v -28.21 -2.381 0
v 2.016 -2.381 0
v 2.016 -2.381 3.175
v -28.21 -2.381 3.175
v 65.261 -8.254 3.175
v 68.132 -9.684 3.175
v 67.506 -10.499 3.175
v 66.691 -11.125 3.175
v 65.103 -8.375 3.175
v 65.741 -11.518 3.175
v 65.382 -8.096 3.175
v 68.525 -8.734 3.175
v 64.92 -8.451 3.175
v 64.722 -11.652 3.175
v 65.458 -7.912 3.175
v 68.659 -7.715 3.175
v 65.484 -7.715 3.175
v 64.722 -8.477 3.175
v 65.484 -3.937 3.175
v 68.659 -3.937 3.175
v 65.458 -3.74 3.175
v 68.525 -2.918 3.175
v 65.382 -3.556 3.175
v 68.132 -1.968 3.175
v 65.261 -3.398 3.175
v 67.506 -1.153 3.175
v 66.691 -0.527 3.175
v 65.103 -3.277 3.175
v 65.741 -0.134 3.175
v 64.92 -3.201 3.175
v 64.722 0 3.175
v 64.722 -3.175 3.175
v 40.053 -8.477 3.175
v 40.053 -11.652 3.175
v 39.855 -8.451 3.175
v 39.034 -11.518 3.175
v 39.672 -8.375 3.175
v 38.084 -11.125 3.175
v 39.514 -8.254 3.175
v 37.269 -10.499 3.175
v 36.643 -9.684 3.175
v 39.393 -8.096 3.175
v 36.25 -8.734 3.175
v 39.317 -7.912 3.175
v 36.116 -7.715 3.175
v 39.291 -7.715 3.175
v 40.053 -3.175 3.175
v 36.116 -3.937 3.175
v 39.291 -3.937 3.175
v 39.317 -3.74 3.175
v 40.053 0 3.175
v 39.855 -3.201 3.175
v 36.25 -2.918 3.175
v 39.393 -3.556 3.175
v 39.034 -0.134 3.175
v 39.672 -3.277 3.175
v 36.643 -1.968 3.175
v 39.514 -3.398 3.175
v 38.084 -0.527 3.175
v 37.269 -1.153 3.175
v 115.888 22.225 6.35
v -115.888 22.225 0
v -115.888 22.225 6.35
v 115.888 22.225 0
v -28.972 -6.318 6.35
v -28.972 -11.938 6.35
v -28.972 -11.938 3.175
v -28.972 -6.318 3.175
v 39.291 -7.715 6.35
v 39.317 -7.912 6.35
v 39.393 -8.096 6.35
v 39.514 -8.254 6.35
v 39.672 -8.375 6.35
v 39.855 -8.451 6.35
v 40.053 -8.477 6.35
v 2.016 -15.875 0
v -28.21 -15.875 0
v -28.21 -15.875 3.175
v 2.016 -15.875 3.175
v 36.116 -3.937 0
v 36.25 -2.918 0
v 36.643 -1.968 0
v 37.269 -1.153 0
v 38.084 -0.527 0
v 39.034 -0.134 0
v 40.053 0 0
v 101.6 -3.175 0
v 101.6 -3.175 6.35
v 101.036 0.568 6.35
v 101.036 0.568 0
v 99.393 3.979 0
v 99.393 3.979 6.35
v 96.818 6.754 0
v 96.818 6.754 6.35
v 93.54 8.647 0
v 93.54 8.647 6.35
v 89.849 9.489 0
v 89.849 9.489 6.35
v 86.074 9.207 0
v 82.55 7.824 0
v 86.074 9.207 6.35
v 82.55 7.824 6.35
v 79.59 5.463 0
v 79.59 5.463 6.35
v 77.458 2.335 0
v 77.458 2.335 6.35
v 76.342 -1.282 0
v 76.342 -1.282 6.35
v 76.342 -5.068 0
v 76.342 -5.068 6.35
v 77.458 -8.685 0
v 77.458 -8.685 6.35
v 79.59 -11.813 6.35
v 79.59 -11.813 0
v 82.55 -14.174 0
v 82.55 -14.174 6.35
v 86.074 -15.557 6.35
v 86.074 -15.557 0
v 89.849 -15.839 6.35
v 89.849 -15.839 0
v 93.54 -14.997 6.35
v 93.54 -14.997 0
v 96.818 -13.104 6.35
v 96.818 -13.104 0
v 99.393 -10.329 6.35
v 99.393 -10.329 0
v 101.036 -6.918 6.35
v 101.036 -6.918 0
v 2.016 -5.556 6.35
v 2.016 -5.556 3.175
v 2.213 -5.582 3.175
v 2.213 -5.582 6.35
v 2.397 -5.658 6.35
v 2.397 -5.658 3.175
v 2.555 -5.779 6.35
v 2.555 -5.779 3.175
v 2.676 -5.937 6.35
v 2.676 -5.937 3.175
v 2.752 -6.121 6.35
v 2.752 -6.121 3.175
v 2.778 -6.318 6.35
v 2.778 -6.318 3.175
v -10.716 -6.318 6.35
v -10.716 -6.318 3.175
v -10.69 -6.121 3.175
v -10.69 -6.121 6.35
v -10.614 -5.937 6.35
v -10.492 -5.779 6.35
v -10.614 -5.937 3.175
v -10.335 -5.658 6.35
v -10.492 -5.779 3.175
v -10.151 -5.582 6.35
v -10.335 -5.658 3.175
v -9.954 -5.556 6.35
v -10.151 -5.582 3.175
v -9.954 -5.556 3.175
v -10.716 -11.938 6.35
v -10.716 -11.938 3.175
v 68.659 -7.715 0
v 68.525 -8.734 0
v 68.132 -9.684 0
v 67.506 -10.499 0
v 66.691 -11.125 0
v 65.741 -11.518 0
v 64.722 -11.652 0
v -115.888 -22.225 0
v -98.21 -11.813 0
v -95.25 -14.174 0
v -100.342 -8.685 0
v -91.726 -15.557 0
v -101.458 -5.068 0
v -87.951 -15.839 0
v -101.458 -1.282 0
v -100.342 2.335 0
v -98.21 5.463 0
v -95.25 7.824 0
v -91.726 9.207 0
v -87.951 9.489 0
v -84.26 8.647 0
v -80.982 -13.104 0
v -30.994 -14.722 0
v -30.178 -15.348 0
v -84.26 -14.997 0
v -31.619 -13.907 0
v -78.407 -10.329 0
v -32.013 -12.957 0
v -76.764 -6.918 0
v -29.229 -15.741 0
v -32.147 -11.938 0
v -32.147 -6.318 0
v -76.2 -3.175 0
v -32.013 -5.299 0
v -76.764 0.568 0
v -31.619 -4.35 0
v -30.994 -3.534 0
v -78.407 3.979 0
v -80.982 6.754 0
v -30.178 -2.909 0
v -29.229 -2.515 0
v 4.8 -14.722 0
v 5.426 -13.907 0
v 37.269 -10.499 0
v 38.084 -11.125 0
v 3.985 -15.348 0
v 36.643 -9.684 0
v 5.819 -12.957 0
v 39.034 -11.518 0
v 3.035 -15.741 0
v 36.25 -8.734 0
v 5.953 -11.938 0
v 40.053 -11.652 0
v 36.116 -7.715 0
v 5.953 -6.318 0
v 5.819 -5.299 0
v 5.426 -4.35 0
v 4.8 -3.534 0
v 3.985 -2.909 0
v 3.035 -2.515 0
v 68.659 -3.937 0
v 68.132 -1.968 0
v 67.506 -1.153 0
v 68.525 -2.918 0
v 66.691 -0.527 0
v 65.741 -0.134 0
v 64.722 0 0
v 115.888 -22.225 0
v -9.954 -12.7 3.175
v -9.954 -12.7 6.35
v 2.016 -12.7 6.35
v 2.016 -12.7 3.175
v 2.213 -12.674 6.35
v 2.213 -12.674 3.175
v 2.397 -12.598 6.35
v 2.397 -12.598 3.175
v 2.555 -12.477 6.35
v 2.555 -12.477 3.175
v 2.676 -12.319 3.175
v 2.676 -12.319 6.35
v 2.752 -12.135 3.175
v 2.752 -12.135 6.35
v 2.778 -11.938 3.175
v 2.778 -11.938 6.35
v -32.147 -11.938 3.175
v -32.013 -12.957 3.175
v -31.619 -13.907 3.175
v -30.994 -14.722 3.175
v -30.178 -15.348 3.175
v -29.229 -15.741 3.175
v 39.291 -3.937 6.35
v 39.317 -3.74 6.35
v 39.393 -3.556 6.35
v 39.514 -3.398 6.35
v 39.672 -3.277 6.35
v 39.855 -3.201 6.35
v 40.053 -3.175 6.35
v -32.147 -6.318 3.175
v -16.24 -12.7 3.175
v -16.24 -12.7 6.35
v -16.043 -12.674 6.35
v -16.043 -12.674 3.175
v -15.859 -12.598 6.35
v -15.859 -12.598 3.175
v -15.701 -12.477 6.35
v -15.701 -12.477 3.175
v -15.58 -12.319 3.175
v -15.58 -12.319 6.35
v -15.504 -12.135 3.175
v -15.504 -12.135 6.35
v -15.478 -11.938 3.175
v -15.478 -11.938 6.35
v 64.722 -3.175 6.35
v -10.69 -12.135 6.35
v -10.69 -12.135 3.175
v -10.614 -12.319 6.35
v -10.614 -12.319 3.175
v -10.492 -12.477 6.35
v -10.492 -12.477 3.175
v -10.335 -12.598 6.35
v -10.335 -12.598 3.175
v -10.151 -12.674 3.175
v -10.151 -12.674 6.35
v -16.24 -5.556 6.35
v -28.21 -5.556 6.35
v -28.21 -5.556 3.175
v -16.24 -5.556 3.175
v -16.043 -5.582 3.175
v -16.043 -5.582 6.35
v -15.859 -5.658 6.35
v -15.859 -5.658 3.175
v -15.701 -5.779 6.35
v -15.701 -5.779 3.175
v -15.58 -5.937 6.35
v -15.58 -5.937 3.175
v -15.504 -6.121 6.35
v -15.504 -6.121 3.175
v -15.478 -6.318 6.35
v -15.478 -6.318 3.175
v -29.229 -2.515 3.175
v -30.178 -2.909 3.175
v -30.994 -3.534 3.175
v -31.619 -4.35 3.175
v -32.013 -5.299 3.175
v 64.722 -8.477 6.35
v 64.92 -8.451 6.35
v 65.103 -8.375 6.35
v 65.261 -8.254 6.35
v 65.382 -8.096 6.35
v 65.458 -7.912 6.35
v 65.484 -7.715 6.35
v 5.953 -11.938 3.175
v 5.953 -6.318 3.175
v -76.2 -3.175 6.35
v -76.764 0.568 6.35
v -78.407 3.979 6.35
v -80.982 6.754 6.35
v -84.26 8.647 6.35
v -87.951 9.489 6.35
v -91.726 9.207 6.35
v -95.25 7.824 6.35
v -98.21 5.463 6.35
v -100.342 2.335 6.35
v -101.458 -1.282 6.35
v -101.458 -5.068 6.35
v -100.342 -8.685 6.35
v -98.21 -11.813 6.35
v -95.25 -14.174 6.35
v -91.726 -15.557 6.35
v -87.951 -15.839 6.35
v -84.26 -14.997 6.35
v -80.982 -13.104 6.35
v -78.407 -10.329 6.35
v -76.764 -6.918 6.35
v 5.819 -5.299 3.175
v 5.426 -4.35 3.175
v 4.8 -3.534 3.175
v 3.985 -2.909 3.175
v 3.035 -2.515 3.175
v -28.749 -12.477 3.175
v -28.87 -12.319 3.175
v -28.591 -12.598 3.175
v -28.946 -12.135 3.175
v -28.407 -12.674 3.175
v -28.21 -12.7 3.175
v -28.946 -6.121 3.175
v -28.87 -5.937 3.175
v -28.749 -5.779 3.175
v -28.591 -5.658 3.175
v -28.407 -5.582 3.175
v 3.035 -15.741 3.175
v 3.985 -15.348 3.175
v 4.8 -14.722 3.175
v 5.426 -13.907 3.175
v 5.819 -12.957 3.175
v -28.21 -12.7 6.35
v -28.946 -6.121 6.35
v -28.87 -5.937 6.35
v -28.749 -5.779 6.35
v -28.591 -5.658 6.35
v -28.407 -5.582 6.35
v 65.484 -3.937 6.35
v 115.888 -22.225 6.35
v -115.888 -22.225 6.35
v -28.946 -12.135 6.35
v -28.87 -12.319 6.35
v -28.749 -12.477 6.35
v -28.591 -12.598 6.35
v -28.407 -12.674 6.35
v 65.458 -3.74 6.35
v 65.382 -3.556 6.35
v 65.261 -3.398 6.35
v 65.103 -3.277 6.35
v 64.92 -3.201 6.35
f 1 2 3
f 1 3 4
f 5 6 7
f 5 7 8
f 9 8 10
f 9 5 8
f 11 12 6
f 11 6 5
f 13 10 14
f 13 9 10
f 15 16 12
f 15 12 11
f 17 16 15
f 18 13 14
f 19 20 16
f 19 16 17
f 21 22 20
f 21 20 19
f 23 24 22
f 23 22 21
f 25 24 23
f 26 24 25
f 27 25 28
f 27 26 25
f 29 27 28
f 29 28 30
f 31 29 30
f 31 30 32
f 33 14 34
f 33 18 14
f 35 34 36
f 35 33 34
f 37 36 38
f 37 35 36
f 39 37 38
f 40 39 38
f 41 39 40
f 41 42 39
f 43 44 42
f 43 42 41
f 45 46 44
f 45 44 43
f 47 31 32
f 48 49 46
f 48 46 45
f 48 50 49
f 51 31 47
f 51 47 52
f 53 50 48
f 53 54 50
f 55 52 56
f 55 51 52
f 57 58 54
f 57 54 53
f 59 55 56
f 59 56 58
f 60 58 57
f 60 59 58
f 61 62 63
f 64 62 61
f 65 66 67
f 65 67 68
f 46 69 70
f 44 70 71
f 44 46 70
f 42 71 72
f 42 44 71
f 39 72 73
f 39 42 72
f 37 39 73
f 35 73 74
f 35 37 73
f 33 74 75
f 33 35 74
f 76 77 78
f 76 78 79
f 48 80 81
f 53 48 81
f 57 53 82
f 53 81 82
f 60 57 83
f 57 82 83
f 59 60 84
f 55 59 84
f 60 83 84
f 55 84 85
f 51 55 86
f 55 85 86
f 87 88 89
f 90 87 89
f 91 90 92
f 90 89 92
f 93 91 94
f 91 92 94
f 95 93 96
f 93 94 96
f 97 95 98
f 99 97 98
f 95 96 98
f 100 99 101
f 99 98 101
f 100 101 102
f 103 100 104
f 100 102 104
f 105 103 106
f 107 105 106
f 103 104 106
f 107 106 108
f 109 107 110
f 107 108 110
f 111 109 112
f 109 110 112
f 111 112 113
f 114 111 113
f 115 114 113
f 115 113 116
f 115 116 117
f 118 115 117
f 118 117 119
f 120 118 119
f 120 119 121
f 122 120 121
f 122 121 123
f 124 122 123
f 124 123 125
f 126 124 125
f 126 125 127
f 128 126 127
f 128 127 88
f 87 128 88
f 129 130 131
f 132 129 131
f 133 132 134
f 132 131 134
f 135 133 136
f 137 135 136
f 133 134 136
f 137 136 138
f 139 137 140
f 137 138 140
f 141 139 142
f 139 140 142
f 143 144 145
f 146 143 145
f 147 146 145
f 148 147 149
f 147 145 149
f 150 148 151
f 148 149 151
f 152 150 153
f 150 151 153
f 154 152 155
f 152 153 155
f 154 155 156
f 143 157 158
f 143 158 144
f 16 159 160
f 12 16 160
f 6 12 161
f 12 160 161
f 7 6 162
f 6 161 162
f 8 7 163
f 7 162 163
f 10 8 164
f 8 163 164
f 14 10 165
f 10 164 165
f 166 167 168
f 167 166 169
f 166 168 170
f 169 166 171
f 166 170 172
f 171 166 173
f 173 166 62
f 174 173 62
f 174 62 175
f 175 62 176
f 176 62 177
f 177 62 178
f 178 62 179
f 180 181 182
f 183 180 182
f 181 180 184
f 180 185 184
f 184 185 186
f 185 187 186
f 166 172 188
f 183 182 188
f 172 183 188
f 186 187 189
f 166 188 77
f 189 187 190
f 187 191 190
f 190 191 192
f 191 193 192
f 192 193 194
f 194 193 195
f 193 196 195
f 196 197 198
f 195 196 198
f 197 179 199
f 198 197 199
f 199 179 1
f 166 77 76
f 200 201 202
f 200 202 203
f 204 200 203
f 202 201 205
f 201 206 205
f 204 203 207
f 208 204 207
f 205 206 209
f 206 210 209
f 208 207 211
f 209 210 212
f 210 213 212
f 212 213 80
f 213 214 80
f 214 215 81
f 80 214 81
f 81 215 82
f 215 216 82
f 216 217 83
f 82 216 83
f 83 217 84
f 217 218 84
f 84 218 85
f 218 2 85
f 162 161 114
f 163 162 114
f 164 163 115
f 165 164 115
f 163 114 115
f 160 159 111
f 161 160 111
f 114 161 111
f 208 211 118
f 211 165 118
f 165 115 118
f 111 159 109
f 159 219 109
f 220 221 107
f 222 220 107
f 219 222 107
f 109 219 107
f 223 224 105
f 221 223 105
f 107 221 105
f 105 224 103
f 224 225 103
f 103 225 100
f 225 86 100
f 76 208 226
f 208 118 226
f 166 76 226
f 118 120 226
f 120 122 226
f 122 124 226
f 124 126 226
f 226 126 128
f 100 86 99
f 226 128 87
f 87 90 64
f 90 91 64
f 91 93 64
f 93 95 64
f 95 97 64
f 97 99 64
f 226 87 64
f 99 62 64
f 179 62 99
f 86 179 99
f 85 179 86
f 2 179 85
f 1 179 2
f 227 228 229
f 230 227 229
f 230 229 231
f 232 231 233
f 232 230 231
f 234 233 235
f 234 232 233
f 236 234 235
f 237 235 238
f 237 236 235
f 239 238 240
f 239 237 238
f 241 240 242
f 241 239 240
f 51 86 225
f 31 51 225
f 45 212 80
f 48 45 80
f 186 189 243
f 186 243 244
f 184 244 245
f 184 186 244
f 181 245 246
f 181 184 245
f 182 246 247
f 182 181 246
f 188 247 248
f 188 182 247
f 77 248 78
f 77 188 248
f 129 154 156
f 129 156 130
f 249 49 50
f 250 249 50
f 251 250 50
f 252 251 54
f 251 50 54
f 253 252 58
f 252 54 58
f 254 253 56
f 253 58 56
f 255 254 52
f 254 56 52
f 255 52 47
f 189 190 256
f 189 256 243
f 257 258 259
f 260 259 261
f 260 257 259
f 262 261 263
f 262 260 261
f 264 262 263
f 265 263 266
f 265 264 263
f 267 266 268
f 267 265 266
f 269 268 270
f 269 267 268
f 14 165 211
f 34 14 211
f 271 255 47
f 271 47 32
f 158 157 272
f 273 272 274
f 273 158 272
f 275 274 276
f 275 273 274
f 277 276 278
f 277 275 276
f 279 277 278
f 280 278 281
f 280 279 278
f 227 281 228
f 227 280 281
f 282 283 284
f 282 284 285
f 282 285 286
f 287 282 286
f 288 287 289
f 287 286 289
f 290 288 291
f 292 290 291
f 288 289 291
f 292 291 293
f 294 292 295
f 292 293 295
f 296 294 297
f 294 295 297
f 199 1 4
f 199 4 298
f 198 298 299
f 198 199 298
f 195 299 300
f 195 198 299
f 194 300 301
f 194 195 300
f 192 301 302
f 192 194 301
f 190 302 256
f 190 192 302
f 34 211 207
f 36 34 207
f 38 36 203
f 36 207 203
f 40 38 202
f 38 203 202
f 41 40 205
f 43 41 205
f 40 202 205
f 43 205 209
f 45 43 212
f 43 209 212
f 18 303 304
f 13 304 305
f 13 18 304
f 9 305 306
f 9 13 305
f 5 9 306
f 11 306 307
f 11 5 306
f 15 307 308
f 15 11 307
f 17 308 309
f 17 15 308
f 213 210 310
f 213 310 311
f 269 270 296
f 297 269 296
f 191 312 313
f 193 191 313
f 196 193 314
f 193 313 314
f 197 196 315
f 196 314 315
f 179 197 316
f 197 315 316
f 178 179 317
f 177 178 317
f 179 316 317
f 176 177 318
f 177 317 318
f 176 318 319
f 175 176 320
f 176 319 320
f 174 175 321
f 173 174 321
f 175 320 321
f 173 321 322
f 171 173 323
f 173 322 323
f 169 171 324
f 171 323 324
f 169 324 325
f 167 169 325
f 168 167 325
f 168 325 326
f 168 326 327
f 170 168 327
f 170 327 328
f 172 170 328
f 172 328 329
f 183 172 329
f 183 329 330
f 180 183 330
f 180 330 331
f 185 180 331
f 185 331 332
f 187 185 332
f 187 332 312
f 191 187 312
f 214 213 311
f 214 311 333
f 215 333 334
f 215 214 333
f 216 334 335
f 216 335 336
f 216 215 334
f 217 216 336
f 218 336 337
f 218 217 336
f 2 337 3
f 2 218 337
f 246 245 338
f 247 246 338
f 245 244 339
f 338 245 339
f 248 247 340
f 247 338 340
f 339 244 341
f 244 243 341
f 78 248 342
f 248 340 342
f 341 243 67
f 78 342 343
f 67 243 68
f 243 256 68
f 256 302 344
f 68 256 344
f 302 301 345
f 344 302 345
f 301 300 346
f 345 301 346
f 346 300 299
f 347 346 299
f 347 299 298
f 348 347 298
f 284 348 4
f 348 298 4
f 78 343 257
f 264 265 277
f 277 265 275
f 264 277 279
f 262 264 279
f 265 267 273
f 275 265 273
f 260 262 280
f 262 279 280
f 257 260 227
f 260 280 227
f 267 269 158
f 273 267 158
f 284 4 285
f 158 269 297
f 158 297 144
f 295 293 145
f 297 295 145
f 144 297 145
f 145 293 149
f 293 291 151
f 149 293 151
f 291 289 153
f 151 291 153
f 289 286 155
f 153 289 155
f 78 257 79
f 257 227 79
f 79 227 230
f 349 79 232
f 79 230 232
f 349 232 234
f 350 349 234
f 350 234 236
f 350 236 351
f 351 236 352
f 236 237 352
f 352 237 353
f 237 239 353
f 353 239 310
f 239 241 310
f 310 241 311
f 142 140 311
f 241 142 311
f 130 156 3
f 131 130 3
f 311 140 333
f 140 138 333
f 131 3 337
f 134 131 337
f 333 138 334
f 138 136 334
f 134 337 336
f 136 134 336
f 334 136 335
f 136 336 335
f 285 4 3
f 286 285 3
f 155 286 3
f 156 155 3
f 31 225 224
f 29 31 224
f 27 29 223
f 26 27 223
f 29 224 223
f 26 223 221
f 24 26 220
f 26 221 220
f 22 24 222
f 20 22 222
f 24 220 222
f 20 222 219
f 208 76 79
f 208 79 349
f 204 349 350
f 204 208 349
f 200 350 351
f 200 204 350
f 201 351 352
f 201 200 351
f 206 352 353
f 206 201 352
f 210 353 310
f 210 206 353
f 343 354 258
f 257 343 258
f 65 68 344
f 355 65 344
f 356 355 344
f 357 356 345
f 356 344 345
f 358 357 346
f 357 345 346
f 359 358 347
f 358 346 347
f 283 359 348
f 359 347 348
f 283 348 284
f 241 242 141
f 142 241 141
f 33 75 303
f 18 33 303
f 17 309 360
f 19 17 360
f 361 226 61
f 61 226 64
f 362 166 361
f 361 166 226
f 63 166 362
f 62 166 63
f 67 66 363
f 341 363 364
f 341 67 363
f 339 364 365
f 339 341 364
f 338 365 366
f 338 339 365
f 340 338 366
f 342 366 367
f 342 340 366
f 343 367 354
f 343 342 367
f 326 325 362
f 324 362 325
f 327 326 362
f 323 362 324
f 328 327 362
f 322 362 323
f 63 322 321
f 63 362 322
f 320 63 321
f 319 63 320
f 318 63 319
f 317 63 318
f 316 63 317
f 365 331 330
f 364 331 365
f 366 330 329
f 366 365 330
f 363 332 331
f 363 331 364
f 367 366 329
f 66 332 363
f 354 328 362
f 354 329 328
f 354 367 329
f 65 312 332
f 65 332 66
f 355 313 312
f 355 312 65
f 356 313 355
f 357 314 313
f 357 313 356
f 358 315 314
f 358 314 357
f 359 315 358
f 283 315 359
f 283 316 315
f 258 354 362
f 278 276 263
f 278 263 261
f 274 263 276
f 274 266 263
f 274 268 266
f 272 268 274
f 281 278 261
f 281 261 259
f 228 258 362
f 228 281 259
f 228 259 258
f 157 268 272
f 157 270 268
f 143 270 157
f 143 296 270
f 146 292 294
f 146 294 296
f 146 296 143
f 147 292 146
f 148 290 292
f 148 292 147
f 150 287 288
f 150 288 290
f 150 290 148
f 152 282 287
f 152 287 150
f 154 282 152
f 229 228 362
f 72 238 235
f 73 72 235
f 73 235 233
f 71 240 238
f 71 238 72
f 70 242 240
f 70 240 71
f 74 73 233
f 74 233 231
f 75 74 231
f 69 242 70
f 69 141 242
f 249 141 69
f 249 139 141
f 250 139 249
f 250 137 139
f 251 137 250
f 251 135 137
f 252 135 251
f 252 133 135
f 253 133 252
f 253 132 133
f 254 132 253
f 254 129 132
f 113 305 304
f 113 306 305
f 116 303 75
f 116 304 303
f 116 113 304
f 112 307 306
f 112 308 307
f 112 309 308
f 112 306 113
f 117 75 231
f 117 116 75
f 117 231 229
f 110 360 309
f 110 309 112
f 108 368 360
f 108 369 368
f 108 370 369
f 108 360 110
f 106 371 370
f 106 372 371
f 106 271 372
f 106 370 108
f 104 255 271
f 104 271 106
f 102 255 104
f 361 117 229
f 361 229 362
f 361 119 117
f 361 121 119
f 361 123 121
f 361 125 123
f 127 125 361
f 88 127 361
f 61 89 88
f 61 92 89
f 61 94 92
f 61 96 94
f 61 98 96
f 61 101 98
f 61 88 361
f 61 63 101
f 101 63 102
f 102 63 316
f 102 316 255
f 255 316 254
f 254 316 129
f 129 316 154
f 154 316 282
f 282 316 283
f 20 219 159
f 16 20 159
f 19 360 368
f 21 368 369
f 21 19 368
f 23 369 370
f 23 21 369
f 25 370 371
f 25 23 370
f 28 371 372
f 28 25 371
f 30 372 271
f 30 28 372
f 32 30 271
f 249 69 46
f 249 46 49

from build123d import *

# Parameters (mm, degrees)
SKETCH1_W           = 231.775
SKETCH1_H           = 44.45
BOSS_EXTRUDE1_DEPTH = 6.35
CUT_EXTRUDE1_REACH  = 120.17
SKETCH2_R           = 12.7
SKETCH2_W           = 13.49375
SKETCH2_H           = 7.14375
SKETCH2_W_2         = 26.19375
SKETCH2_H_2         = 5.30225
FILLET1_R           = 0.762
CUT_EXTRUDE2_DEPTH  = 3.175
CUT_EXTRUDE3_DEPTH  = 3.175


with BuildPart() as part:
    # Sketch1 → Boss-Extrude1 (new body)
    with BuildSketch(Plane.XY):
        Rectangle(SKETCH1_W, SKETCH1_H)
    extrude(amount=BOSS_EXTRUDE1_DEPTH)

    # Sketch2 → Cut-Extrude1 (cut, up to next)
    with BuildSketch(Plane.XY.offset(6.35), mode=Mode.PRIVATE) as cut_extrude1_sk1:
        with Locations((88.9, -3.175)):
            Circle(SKETCH2_R)
    cut_extrude1_tool1 = extrude(cut_extrude1_sk1.sketch, amount=-CUT_EXTRUDE1_REACH, mode=Mode.PRIVATE) & part.part
    # Sketch2 → Cut-Extrude1 (cut, up to next)
    with BuildSketch(Plane.XY.offset(6.35), mode=Mode.PRIVATE) as cut_extrude1_sk2:
        with Locations((-88.9, -3.175)):
            Circle(SKETCH2_R)
    cut_extrude1_tool2 = extrude(cut_extrude1_sk2.sketch, amount=-CUT_EXTRUDE1_REACH, mode=Mode.PRIVATE) & part.part
    # Sketch2 → Cut-Extrude1 (cut, up to next)
    with BuildSketch(Plane.XY.offset(6.35), mode=Mode.PRIVATE) as cut_extrude1_sk3:
        with Locations((-22.225, -9.128125)):
            Rectangle(SKETCH2_W, SKETCH2_H)
    cut_extrude1_tool3 = extrude(cut_extrude1_sk3.sketch, amount=-CUT_EXTRUDE1_REACH, mode=Mode.PRIVATE) & part.part
    # Sketch2 → Cut-Extrude1 (cut, up to next)
    with BuildSketch(Plane.XY.offset(6.35), mode=Mode.PRIVATE) as cut_extrude1_sk4:
        with Locations((-3.96875, -9.128125)):
            Rectangle(SKETCH2_W, SKETCH2_H)
    cut_extrude1_tool4 = extrude(cut_extrude1_sk4.sketch, amount=-CUT_EXTRUDE1_REACH, mode=Mode.PRIVATE) & part.part
    # Sketch2 → Cut-Extrude1 (cut, up to next)
    with BuildSketch(Plane.XY.offset(6.35), mode=Mode.PRIVATE) as cut_extrude1_sk5:
        with Locations((52.3875, -5.826125)):
            Rectangle(SKETCH2_W_2, SKETCH2_H_2)
    cut_extrude1_tool5 = extrude(cut_extrude1_sk5.sketch, amount=-CUT_EXTRUDE1_REACH, mode=Mode.PRIVATE) & part.part
    add(cut_extrude1_tool1.solids().sort_by_distance((88.9, -3.175, 6.35))[0], mode=Mode.SUBTRACT)
    add(cut_extrude1_tool2.solids().sort_by_distance((-88.9, -3.175, 6.35))[0], mode=Mode.SUBTRACT)
    add(cut_extrude1_tool3.solids().sort_by_distance((-22.225, -9.128125, 6.35))[0], mode=Mode.SUBTRACT)
    add(cut_extrude1_tool4.solids().sort_by_distance((-3.96875, -9.128125, 6.35))[0], mode=Mode.SUBTRACT)
    add(cut_extrude1_tool5.solids().sort_by_distance((52.3875, -5.826125, 6.35))[0], mode=Mode.SUBTRACT)

    # Fillet1
    fillet1_edges = [part.edges().sort_by_distance(p)[0] for p in [
        (-28.971875, -5.55625, 3.175),
        (-15.478125, -5.55625, 3.175),
        (-15.478125, -12.7, 3.175),
        (-28.971875, -12.7, 3.175),
        (-10.715625, -12.7, 3.175),
        (-10.715625, -5.55625, 3.175),
        (2.778125, -5.55625, 3.175),
        (2.778125, -12.7, 3.175),
        (39.290625, -8.47725, 3.175),
        (39.290625, -3.175, 3.175),
        (65.484375, -3.175, 3.175),
        (65.484375, -8.47725, 3.175),
    ]]
    fillet(fillet1_edges, radius=FILLET1_R)

    # Sketch3 → Cut-Extrude2 (cut)
    with BuildSketch(Plane(origin=(0, 0, 0), x_dir=(-1, 0, 0), z_dir=(0, 0, -1))):
        with BuildLine():
            Line((-64.722375, -11.65225), (-40.052625, -11.65225))
            ThreePointArc((-40.052625, -11.65225), (-37.268745602, -10.499129398), (-36.115625, -7.71525))
            Line((-36.115625, -7.71525), (-36.115625, -3.937))
            ThreePointArc((-36.115625, -3.937), (-37.268745602, -1.153120602), (-40.052625, 0))
            Line((-40.052625, 0), (-64.722375, 0))
            ThreePointArc((-64.722375, 0), (-67.506254398, -1.153120602), (-68.659375, -3.937))
            Line((-68.659375, -3.937), (-68.659375, -7.71525))
            ThreePointArc((-68.659375, -7.71525), (-67.506254398, -10.499129398), (-64.722375, -11.65225))
        make_face()
    extrude(amount=-CUT_EXTRUDE2_DEPTH, mode=Mode.SUBTRACT)

    # Sketch4 → Cut-Extrude3 (cut)
    with BuildSketch(Plane(origin=(0, 0, 0), x_dir=(-1, 0, 0), z_dir=(0, 0, -1))):
        with BuildLine():
            Line((28.209875, -15.875), (-2.016125, -15.875))
            ThreePointArc((-2.016125, -15.875), (-4.800004398, -14.721879398), (-5.953125, -11.938))
            Line((-5.953125, -11.938), (-5.953125, -6.31825))
            ThreePointArc((-5.953125, -6.31825), (-4.800004398, -3.534370602), (-2.016125, -2.38125))
            Line((-2.016125, -2.38125), (28.209875, -2.38125))
            ThreePointArc((28.209875, -2.38125), (30.993754398, -3.534370602), (32.146875, -6.31825))
            Line((32.146875, -6.31825), (32.146875, -11.938))
            ThreePointArc((32.146875, -11.938), (30.993754398, -14.721879398), (28.209875, -15.875))
        make_face()
    extrude(amount=-CUT_EXTRUDE3_DEPTH, mode=Mode.SUBTRACT)


solid = part.part
